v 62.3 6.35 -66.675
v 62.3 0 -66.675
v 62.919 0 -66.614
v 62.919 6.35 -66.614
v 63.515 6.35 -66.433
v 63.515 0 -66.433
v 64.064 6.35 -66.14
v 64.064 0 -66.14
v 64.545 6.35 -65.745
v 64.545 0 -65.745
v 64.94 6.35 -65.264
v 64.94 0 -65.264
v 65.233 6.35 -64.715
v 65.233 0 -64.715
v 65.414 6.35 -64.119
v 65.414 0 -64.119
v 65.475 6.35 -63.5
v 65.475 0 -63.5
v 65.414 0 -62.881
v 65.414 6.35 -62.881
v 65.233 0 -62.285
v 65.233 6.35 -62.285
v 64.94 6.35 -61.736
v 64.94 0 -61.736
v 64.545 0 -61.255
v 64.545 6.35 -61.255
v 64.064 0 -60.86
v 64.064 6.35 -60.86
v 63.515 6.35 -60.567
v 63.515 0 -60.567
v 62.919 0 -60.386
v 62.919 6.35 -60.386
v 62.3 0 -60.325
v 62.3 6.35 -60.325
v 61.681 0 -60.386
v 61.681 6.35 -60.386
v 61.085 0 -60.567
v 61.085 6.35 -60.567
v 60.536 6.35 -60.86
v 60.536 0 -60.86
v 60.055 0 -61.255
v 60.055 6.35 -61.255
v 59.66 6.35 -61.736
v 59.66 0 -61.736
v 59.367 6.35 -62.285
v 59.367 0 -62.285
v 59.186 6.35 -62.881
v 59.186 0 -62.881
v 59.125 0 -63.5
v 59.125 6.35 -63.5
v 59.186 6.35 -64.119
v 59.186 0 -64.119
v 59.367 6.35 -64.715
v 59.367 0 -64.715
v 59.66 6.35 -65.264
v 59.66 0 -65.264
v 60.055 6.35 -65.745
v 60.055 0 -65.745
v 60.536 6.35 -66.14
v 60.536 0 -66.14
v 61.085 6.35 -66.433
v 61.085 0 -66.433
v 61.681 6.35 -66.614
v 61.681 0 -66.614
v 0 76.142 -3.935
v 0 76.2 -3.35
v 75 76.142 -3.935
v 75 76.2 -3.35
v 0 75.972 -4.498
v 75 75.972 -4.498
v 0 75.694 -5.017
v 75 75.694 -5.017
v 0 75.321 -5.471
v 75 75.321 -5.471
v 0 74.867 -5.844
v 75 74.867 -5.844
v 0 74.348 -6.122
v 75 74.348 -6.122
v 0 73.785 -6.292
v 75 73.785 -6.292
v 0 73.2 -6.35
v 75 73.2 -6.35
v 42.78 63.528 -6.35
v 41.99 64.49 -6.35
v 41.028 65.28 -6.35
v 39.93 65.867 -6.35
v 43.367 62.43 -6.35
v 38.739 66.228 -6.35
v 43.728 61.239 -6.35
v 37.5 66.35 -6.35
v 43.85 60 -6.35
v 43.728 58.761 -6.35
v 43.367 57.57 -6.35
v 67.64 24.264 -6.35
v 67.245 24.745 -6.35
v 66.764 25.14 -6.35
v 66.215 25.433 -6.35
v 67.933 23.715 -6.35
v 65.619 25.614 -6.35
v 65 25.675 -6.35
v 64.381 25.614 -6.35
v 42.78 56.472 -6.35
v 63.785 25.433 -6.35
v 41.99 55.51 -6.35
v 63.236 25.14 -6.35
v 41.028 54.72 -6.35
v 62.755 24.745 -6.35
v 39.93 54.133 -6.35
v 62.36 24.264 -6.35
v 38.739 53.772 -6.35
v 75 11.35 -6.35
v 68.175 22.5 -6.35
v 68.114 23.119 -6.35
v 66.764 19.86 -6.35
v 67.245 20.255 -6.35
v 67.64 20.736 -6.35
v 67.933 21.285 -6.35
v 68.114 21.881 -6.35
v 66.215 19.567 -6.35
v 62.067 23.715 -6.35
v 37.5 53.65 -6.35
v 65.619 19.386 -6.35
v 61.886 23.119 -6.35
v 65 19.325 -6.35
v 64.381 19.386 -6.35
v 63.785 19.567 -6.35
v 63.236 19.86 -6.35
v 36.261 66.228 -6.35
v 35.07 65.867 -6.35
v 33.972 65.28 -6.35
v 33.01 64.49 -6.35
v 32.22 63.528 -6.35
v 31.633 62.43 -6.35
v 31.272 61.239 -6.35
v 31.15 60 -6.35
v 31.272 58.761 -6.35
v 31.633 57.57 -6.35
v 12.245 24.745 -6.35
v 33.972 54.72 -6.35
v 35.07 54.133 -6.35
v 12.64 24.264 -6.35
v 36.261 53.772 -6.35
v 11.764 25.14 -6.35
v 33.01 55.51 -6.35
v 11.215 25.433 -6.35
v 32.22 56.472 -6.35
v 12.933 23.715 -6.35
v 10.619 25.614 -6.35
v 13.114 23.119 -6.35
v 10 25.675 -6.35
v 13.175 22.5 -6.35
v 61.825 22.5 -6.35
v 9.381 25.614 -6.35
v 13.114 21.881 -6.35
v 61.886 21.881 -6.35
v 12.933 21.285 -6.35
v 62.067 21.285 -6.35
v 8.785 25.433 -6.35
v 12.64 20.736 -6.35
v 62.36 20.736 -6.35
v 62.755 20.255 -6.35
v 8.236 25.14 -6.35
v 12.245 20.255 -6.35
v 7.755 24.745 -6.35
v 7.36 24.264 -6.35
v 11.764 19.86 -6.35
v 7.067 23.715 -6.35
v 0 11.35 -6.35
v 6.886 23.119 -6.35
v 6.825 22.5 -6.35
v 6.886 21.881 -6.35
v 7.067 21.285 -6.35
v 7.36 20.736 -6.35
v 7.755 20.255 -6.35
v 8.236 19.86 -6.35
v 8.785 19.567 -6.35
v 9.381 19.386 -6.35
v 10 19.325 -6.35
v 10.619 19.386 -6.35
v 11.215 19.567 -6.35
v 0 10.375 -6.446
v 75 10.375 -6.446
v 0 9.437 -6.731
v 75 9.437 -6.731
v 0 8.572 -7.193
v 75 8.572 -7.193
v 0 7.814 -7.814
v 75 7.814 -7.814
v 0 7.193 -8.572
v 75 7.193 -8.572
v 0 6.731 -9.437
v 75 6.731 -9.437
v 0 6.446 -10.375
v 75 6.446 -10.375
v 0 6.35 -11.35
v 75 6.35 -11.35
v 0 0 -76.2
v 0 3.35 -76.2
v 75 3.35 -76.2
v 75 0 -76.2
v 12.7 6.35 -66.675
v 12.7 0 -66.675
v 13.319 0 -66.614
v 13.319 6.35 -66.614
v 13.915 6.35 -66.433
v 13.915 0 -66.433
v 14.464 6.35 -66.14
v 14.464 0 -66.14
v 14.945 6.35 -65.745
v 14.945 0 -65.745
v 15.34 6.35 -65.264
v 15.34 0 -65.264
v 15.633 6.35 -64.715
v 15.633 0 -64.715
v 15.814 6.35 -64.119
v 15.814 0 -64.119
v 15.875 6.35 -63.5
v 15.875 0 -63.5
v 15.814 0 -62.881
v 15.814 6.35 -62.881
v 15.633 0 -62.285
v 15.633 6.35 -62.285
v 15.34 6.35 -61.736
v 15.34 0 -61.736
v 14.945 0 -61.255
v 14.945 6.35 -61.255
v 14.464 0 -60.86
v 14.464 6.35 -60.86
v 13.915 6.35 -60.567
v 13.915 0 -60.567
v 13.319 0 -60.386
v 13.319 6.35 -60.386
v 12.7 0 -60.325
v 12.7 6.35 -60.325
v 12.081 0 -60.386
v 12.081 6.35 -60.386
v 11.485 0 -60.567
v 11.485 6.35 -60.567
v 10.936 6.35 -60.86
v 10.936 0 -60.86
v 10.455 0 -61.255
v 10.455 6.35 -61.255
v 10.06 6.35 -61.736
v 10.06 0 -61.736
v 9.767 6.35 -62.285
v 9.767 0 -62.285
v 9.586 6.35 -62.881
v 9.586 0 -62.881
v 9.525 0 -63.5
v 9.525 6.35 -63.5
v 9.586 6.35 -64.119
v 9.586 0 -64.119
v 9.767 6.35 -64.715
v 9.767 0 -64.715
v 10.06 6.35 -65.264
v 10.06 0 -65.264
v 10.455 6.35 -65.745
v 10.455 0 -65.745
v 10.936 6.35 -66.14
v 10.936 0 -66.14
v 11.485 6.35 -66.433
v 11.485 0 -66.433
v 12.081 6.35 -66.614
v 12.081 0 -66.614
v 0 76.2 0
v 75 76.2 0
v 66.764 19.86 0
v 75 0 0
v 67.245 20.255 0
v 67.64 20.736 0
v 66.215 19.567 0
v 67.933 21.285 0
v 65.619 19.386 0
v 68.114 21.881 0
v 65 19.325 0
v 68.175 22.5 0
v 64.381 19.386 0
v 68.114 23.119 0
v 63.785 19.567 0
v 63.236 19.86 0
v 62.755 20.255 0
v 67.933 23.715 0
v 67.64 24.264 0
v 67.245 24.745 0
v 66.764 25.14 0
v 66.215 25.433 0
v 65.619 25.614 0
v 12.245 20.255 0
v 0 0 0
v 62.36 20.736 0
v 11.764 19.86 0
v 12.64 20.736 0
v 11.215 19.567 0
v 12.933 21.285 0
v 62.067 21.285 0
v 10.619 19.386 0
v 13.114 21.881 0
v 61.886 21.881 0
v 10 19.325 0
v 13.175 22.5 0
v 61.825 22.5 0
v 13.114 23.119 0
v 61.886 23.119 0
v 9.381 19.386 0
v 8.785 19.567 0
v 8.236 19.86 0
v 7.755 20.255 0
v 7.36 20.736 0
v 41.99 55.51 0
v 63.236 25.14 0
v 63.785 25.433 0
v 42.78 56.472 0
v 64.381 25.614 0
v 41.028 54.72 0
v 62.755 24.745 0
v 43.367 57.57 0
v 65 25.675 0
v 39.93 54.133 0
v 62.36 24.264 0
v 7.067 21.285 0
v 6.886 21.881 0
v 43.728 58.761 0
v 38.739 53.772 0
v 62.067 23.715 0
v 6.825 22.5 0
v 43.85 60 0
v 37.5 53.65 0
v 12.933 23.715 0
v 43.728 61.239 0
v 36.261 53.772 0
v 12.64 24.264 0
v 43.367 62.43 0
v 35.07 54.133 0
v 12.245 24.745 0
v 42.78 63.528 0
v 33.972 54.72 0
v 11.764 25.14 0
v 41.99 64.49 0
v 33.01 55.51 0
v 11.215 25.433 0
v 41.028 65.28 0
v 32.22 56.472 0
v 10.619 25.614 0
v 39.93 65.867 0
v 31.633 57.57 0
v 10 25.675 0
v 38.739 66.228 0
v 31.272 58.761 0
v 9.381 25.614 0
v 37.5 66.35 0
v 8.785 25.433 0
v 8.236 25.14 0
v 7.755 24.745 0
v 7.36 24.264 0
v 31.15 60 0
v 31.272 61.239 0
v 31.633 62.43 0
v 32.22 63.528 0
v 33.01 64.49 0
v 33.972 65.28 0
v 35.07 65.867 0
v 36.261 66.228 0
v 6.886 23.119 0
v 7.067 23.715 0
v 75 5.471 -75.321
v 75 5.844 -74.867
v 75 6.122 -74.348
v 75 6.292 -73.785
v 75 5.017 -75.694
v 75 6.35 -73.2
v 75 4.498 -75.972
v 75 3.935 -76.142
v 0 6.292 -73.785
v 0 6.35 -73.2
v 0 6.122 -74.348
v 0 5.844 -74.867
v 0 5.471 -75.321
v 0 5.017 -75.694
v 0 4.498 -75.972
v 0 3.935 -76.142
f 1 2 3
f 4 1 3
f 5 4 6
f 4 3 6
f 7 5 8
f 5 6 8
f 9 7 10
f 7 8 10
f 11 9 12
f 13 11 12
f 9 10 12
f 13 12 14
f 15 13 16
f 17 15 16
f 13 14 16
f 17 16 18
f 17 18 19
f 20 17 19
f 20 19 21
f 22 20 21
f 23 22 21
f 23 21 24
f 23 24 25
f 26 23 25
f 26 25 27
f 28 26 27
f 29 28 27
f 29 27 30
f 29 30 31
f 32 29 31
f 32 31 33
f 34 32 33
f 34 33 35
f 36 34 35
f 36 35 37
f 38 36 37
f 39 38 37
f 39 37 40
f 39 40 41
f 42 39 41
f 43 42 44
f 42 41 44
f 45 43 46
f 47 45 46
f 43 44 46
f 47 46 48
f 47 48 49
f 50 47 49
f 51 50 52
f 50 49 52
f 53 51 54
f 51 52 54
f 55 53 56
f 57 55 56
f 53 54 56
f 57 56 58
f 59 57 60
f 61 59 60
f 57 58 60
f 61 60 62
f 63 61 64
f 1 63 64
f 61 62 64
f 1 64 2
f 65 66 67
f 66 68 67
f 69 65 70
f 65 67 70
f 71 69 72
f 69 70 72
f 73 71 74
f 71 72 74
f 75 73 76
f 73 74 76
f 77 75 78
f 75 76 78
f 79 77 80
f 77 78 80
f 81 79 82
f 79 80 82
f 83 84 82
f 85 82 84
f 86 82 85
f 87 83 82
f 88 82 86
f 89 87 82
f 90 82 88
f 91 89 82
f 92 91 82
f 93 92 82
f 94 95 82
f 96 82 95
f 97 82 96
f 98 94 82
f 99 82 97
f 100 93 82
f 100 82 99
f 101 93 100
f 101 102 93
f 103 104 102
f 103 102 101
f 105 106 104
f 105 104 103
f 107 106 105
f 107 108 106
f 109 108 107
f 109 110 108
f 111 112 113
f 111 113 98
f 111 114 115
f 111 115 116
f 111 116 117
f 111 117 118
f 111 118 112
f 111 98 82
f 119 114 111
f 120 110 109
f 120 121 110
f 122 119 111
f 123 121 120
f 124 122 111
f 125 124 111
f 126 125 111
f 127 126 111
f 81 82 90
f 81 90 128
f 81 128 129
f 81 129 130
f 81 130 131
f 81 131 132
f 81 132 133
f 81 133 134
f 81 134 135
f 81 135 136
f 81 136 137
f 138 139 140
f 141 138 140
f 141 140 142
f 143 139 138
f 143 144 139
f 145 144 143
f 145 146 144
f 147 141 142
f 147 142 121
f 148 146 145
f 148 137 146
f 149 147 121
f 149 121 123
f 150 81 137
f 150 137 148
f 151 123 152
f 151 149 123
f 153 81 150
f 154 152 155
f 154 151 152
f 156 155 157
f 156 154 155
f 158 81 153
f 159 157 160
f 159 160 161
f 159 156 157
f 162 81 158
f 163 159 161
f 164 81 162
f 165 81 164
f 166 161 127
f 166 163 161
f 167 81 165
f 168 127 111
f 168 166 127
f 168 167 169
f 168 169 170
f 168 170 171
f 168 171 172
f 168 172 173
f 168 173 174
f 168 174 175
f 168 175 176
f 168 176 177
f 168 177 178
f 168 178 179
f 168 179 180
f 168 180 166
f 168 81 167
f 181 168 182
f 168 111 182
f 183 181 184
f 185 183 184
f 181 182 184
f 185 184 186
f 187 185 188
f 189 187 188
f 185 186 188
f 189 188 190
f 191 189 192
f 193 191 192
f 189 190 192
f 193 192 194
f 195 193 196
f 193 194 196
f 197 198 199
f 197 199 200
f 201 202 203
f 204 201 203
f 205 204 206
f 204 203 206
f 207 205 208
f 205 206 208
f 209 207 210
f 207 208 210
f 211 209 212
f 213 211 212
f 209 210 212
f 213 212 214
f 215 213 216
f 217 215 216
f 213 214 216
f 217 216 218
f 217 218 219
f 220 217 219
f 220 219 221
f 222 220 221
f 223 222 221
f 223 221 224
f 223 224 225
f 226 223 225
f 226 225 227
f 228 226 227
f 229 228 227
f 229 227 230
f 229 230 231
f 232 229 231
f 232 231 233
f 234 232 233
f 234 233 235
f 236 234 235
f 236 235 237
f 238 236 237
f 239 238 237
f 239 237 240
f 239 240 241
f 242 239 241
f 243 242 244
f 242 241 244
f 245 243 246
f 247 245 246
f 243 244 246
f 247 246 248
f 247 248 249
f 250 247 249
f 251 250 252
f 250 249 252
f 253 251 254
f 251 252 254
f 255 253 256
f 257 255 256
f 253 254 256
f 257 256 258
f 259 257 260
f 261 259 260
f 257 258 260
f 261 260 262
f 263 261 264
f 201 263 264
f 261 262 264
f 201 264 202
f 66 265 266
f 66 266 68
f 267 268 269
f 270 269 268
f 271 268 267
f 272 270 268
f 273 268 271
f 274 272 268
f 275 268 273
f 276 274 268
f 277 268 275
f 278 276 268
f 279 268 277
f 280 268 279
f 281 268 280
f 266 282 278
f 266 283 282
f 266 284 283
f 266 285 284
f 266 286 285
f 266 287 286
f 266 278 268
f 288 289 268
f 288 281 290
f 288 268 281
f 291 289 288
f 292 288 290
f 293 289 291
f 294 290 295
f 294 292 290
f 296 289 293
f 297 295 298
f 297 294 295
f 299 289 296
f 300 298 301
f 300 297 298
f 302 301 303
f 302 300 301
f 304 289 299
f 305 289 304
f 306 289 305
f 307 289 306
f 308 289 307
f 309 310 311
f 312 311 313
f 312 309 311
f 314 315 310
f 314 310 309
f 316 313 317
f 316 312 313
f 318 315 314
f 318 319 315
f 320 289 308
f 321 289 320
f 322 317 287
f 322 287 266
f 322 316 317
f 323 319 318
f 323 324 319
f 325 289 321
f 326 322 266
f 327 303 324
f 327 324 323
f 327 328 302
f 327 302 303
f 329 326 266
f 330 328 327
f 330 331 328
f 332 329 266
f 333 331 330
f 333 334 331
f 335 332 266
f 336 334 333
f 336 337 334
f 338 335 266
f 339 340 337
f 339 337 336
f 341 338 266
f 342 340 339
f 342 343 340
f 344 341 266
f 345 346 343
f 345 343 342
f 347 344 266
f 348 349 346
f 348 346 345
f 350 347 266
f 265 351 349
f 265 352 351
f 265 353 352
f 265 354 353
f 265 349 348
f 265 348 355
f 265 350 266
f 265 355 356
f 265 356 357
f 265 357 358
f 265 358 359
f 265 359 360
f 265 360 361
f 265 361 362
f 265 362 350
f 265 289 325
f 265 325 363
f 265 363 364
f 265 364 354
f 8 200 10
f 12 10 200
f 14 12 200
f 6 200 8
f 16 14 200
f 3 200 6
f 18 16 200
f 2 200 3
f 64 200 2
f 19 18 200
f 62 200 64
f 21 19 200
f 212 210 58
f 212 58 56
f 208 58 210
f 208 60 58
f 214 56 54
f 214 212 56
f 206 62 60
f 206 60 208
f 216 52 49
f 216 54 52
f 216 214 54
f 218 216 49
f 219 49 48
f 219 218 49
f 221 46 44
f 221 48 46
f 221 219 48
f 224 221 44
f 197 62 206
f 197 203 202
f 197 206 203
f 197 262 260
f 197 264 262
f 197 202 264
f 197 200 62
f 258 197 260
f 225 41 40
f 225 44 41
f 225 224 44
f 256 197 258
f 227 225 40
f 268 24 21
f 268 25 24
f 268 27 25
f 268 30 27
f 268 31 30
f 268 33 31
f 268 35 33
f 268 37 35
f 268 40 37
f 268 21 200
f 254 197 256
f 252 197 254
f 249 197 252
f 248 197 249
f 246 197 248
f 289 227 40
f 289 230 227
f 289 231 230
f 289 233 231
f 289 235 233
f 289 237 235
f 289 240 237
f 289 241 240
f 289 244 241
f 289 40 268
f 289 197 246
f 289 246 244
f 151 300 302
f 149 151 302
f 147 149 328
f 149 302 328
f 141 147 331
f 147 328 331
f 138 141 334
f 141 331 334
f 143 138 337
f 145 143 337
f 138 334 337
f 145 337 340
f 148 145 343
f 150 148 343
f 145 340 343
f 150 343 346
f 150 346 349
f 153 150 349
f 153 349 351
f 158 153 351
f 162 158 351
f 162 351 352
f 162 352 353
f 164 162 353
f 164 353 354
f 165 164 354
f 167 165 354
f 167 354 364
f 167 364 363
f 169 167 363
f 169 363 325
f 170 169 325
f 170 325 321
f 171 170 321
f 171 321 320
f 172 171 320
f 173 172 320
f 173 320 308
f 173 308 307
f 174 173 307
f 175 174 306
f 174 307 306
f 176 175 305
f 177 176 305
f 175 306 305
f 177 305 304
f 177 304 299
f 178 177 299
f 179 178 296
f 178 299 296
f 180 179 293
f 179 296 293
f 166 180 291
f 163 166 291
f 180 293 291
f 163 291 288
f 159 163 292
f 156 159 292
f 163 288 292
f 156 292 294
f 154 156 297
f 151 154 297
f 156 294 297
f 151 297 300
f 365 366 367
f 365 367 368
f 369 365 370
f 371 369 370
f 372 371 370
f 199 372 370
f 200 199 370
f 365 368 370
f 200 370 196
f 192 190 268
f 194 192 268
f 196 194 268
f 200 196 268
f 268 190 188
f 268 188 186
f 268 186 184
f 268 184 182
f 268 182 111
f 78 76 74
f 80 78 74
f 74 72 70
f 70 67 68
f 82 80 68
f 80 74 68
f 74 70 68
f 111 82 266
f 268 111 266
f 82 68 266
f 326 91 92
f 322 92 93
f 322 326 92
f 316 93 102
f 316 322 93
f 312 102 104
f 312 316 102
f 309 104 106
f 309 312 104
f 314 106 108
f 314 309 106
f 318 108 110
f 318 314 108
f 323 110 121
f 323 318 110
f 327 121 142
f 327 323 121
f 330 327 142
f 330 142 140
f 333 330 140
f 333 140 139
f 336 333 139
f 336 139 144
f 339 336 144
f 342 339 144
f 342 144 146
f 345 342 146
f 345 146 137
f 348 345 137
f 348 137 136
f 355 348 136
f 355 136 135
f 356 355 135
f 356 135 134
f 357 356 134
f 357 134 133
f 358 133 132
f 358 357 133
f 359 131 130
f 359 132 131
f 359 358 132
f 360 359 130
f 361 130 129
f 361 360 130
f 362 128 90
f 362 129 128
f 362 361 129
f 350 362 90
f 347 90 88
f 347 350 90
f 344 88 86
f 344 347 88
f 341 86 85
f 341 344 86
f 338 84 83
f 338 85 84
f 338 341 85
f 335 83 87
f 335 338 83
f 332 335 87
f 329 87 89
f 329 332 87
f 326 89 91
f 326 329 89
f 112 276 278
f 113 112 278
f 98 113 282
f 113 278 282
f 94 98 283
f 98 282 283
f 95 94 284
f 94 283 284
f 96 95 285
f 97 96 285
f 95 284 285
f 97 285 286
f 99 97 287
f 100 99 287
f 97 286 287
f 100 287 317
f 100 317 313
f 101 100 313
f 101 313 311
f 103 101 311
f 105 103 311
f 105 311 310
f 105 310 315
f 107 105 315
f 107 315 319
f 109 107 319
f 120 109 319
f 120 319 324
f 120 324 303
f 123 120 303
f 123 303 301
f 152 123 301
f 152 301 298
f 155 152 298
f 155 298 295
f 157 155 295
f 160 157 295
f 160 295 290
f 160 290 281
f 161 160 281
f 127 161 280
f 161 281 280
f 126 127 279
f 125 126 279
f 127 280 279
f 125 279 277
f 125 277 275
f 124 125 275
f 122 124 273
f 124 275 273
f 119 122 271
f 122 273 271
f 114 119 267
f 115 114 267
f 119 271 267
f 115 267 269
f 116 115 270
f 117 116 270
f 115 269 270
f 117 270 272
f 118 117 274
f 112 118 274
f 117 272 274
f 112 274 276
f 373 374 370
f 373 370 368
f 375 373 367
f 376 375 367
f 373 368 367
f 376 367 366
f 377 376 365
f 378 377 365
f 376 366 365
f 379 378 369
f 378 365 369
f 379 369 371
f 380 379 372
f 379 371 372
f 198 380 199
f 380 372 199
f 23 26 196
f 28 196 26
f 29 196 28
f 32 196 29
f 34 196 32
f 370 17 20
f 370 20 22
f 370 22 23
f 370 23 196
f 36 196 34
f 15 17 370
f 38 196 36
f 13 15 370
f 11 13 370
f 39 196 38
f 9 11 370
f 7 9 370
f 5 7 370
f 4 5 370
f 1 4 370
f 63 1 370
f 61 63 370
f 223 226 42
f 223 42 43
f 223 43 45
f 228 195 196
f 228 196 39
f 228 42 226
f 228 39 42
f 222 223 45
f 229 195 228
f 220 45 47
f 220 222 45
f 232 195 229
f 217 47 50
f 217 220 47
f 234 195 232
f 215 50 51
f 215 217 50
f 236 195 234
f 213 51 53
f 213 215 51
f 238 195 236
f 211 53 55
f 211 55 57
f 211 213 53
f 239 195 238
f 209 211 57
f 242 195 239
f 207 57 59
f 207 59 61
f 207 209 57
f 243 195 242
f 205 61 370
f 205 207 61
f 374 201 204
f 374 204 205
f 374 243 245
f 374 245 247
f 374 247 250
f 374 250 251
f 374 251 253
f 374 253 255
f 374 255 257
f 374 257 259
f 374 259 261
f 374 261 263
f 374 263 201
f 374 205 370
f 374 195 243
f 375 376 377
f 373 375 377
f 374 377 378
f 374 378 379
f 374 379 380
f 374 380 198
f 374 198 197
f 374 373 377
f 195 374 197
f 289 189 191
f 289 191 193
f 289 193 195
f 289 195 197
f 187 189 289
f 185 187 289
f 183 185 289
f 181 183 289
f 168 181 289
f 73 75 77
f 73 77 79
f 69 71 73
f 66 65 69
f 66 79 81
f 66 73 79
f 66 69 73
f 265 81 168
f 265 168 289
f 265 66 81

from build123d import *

# Parameters (mm, degrees)
BOSS_EXTRUDE1_DEPTH = 75
FILLET1_R           = 3
FILLET2_R           = 5
SKETCH2_R           = 6.35
CUT_EXTRUDE1_DEPTH  = 132.293107207
SKETCH3_R           = 3.175
CUT_EXTRUDE2_DEPTH  = 132.293107207
SKETCH4_R           = 3.175
CUT_EXTRUDE3_DEPTH  = 132.293107207


with BuildPart() as part:
    # Sketch1 → Boss-Extrude1 (new body)
    with BuildSketch(Plane(origin=(0, 0, 0), x_dir=(0, 0, -1), z_dir=(1, 0, 0))):
        Polygon((0, 0), (0, 76.2), (6.35, 76.2), (6.35, 6.35), (76.2, 6.35), (76.2, 0), align=None)
    extrude(amount=BOSS_EXTRUDE1_DEPTH)

    # Fillet1
    fillet1_edges = [part.edges().sort_by_distance(p)[0] for p in [
        (37.5, 76.2, -6.35),
        (37.5, 6.35, -76.2),
    ]]
    fillet(fillet1_edges, radius=FILLET1_R)

    # Fillet2
    fillet2_edges = [part.edges().sort_by_distance(p)[0] for p in [
        (37.5, 6.35, -6.35),
    ]]
    fillet(fillet2_edges, radius=FILLET2_R)

    # Sketch2 → Cut-Extrude1 (cut, through all)
    with BuildSketch(Plane(origin=(0, 0, 0), x_dir=(-1, 0, 0), z_dir=(0, 0, -1))):
        with Locations(Location((-37.5, 60, 0), (0, 0, 180))):
            Circle(SKETCH2_R)
    extrude(amount=CUT_EXTRUDE1_DEPTH, mode=Mode.SUBTRACT)

    # Sketch3 → Cut-Extrude2 (cut, through all)
    with BuildSketch(Plane.XY):
        with Locations((10, 22.5)):
            Circle(SKETCH3_R)
        with Locations((65, 22.5)):
            Circle(SKETCH3_R)
    extrude(amount=-CUT_EXTRUDE2_DEPTH, mode=Mode.SUBTRACT)

    # Sketch4 → Cut-Extrude3 (cut, through all)
    with BuildSketch(Plane.XZ):
        with Locations(Location((12.7, -63.5, 0), (0, 0, 270))):
            Circle(SKETCH4_R)
        with Locations(Location((62.3, -63.5, 0), (0, 0, 270))):
            Circle(SKETCH4_R)
    extrude(amount=-CUT_EXTRUDE3_DEPTH, mode=Mode.SUBTRACT)


solid = part.part
